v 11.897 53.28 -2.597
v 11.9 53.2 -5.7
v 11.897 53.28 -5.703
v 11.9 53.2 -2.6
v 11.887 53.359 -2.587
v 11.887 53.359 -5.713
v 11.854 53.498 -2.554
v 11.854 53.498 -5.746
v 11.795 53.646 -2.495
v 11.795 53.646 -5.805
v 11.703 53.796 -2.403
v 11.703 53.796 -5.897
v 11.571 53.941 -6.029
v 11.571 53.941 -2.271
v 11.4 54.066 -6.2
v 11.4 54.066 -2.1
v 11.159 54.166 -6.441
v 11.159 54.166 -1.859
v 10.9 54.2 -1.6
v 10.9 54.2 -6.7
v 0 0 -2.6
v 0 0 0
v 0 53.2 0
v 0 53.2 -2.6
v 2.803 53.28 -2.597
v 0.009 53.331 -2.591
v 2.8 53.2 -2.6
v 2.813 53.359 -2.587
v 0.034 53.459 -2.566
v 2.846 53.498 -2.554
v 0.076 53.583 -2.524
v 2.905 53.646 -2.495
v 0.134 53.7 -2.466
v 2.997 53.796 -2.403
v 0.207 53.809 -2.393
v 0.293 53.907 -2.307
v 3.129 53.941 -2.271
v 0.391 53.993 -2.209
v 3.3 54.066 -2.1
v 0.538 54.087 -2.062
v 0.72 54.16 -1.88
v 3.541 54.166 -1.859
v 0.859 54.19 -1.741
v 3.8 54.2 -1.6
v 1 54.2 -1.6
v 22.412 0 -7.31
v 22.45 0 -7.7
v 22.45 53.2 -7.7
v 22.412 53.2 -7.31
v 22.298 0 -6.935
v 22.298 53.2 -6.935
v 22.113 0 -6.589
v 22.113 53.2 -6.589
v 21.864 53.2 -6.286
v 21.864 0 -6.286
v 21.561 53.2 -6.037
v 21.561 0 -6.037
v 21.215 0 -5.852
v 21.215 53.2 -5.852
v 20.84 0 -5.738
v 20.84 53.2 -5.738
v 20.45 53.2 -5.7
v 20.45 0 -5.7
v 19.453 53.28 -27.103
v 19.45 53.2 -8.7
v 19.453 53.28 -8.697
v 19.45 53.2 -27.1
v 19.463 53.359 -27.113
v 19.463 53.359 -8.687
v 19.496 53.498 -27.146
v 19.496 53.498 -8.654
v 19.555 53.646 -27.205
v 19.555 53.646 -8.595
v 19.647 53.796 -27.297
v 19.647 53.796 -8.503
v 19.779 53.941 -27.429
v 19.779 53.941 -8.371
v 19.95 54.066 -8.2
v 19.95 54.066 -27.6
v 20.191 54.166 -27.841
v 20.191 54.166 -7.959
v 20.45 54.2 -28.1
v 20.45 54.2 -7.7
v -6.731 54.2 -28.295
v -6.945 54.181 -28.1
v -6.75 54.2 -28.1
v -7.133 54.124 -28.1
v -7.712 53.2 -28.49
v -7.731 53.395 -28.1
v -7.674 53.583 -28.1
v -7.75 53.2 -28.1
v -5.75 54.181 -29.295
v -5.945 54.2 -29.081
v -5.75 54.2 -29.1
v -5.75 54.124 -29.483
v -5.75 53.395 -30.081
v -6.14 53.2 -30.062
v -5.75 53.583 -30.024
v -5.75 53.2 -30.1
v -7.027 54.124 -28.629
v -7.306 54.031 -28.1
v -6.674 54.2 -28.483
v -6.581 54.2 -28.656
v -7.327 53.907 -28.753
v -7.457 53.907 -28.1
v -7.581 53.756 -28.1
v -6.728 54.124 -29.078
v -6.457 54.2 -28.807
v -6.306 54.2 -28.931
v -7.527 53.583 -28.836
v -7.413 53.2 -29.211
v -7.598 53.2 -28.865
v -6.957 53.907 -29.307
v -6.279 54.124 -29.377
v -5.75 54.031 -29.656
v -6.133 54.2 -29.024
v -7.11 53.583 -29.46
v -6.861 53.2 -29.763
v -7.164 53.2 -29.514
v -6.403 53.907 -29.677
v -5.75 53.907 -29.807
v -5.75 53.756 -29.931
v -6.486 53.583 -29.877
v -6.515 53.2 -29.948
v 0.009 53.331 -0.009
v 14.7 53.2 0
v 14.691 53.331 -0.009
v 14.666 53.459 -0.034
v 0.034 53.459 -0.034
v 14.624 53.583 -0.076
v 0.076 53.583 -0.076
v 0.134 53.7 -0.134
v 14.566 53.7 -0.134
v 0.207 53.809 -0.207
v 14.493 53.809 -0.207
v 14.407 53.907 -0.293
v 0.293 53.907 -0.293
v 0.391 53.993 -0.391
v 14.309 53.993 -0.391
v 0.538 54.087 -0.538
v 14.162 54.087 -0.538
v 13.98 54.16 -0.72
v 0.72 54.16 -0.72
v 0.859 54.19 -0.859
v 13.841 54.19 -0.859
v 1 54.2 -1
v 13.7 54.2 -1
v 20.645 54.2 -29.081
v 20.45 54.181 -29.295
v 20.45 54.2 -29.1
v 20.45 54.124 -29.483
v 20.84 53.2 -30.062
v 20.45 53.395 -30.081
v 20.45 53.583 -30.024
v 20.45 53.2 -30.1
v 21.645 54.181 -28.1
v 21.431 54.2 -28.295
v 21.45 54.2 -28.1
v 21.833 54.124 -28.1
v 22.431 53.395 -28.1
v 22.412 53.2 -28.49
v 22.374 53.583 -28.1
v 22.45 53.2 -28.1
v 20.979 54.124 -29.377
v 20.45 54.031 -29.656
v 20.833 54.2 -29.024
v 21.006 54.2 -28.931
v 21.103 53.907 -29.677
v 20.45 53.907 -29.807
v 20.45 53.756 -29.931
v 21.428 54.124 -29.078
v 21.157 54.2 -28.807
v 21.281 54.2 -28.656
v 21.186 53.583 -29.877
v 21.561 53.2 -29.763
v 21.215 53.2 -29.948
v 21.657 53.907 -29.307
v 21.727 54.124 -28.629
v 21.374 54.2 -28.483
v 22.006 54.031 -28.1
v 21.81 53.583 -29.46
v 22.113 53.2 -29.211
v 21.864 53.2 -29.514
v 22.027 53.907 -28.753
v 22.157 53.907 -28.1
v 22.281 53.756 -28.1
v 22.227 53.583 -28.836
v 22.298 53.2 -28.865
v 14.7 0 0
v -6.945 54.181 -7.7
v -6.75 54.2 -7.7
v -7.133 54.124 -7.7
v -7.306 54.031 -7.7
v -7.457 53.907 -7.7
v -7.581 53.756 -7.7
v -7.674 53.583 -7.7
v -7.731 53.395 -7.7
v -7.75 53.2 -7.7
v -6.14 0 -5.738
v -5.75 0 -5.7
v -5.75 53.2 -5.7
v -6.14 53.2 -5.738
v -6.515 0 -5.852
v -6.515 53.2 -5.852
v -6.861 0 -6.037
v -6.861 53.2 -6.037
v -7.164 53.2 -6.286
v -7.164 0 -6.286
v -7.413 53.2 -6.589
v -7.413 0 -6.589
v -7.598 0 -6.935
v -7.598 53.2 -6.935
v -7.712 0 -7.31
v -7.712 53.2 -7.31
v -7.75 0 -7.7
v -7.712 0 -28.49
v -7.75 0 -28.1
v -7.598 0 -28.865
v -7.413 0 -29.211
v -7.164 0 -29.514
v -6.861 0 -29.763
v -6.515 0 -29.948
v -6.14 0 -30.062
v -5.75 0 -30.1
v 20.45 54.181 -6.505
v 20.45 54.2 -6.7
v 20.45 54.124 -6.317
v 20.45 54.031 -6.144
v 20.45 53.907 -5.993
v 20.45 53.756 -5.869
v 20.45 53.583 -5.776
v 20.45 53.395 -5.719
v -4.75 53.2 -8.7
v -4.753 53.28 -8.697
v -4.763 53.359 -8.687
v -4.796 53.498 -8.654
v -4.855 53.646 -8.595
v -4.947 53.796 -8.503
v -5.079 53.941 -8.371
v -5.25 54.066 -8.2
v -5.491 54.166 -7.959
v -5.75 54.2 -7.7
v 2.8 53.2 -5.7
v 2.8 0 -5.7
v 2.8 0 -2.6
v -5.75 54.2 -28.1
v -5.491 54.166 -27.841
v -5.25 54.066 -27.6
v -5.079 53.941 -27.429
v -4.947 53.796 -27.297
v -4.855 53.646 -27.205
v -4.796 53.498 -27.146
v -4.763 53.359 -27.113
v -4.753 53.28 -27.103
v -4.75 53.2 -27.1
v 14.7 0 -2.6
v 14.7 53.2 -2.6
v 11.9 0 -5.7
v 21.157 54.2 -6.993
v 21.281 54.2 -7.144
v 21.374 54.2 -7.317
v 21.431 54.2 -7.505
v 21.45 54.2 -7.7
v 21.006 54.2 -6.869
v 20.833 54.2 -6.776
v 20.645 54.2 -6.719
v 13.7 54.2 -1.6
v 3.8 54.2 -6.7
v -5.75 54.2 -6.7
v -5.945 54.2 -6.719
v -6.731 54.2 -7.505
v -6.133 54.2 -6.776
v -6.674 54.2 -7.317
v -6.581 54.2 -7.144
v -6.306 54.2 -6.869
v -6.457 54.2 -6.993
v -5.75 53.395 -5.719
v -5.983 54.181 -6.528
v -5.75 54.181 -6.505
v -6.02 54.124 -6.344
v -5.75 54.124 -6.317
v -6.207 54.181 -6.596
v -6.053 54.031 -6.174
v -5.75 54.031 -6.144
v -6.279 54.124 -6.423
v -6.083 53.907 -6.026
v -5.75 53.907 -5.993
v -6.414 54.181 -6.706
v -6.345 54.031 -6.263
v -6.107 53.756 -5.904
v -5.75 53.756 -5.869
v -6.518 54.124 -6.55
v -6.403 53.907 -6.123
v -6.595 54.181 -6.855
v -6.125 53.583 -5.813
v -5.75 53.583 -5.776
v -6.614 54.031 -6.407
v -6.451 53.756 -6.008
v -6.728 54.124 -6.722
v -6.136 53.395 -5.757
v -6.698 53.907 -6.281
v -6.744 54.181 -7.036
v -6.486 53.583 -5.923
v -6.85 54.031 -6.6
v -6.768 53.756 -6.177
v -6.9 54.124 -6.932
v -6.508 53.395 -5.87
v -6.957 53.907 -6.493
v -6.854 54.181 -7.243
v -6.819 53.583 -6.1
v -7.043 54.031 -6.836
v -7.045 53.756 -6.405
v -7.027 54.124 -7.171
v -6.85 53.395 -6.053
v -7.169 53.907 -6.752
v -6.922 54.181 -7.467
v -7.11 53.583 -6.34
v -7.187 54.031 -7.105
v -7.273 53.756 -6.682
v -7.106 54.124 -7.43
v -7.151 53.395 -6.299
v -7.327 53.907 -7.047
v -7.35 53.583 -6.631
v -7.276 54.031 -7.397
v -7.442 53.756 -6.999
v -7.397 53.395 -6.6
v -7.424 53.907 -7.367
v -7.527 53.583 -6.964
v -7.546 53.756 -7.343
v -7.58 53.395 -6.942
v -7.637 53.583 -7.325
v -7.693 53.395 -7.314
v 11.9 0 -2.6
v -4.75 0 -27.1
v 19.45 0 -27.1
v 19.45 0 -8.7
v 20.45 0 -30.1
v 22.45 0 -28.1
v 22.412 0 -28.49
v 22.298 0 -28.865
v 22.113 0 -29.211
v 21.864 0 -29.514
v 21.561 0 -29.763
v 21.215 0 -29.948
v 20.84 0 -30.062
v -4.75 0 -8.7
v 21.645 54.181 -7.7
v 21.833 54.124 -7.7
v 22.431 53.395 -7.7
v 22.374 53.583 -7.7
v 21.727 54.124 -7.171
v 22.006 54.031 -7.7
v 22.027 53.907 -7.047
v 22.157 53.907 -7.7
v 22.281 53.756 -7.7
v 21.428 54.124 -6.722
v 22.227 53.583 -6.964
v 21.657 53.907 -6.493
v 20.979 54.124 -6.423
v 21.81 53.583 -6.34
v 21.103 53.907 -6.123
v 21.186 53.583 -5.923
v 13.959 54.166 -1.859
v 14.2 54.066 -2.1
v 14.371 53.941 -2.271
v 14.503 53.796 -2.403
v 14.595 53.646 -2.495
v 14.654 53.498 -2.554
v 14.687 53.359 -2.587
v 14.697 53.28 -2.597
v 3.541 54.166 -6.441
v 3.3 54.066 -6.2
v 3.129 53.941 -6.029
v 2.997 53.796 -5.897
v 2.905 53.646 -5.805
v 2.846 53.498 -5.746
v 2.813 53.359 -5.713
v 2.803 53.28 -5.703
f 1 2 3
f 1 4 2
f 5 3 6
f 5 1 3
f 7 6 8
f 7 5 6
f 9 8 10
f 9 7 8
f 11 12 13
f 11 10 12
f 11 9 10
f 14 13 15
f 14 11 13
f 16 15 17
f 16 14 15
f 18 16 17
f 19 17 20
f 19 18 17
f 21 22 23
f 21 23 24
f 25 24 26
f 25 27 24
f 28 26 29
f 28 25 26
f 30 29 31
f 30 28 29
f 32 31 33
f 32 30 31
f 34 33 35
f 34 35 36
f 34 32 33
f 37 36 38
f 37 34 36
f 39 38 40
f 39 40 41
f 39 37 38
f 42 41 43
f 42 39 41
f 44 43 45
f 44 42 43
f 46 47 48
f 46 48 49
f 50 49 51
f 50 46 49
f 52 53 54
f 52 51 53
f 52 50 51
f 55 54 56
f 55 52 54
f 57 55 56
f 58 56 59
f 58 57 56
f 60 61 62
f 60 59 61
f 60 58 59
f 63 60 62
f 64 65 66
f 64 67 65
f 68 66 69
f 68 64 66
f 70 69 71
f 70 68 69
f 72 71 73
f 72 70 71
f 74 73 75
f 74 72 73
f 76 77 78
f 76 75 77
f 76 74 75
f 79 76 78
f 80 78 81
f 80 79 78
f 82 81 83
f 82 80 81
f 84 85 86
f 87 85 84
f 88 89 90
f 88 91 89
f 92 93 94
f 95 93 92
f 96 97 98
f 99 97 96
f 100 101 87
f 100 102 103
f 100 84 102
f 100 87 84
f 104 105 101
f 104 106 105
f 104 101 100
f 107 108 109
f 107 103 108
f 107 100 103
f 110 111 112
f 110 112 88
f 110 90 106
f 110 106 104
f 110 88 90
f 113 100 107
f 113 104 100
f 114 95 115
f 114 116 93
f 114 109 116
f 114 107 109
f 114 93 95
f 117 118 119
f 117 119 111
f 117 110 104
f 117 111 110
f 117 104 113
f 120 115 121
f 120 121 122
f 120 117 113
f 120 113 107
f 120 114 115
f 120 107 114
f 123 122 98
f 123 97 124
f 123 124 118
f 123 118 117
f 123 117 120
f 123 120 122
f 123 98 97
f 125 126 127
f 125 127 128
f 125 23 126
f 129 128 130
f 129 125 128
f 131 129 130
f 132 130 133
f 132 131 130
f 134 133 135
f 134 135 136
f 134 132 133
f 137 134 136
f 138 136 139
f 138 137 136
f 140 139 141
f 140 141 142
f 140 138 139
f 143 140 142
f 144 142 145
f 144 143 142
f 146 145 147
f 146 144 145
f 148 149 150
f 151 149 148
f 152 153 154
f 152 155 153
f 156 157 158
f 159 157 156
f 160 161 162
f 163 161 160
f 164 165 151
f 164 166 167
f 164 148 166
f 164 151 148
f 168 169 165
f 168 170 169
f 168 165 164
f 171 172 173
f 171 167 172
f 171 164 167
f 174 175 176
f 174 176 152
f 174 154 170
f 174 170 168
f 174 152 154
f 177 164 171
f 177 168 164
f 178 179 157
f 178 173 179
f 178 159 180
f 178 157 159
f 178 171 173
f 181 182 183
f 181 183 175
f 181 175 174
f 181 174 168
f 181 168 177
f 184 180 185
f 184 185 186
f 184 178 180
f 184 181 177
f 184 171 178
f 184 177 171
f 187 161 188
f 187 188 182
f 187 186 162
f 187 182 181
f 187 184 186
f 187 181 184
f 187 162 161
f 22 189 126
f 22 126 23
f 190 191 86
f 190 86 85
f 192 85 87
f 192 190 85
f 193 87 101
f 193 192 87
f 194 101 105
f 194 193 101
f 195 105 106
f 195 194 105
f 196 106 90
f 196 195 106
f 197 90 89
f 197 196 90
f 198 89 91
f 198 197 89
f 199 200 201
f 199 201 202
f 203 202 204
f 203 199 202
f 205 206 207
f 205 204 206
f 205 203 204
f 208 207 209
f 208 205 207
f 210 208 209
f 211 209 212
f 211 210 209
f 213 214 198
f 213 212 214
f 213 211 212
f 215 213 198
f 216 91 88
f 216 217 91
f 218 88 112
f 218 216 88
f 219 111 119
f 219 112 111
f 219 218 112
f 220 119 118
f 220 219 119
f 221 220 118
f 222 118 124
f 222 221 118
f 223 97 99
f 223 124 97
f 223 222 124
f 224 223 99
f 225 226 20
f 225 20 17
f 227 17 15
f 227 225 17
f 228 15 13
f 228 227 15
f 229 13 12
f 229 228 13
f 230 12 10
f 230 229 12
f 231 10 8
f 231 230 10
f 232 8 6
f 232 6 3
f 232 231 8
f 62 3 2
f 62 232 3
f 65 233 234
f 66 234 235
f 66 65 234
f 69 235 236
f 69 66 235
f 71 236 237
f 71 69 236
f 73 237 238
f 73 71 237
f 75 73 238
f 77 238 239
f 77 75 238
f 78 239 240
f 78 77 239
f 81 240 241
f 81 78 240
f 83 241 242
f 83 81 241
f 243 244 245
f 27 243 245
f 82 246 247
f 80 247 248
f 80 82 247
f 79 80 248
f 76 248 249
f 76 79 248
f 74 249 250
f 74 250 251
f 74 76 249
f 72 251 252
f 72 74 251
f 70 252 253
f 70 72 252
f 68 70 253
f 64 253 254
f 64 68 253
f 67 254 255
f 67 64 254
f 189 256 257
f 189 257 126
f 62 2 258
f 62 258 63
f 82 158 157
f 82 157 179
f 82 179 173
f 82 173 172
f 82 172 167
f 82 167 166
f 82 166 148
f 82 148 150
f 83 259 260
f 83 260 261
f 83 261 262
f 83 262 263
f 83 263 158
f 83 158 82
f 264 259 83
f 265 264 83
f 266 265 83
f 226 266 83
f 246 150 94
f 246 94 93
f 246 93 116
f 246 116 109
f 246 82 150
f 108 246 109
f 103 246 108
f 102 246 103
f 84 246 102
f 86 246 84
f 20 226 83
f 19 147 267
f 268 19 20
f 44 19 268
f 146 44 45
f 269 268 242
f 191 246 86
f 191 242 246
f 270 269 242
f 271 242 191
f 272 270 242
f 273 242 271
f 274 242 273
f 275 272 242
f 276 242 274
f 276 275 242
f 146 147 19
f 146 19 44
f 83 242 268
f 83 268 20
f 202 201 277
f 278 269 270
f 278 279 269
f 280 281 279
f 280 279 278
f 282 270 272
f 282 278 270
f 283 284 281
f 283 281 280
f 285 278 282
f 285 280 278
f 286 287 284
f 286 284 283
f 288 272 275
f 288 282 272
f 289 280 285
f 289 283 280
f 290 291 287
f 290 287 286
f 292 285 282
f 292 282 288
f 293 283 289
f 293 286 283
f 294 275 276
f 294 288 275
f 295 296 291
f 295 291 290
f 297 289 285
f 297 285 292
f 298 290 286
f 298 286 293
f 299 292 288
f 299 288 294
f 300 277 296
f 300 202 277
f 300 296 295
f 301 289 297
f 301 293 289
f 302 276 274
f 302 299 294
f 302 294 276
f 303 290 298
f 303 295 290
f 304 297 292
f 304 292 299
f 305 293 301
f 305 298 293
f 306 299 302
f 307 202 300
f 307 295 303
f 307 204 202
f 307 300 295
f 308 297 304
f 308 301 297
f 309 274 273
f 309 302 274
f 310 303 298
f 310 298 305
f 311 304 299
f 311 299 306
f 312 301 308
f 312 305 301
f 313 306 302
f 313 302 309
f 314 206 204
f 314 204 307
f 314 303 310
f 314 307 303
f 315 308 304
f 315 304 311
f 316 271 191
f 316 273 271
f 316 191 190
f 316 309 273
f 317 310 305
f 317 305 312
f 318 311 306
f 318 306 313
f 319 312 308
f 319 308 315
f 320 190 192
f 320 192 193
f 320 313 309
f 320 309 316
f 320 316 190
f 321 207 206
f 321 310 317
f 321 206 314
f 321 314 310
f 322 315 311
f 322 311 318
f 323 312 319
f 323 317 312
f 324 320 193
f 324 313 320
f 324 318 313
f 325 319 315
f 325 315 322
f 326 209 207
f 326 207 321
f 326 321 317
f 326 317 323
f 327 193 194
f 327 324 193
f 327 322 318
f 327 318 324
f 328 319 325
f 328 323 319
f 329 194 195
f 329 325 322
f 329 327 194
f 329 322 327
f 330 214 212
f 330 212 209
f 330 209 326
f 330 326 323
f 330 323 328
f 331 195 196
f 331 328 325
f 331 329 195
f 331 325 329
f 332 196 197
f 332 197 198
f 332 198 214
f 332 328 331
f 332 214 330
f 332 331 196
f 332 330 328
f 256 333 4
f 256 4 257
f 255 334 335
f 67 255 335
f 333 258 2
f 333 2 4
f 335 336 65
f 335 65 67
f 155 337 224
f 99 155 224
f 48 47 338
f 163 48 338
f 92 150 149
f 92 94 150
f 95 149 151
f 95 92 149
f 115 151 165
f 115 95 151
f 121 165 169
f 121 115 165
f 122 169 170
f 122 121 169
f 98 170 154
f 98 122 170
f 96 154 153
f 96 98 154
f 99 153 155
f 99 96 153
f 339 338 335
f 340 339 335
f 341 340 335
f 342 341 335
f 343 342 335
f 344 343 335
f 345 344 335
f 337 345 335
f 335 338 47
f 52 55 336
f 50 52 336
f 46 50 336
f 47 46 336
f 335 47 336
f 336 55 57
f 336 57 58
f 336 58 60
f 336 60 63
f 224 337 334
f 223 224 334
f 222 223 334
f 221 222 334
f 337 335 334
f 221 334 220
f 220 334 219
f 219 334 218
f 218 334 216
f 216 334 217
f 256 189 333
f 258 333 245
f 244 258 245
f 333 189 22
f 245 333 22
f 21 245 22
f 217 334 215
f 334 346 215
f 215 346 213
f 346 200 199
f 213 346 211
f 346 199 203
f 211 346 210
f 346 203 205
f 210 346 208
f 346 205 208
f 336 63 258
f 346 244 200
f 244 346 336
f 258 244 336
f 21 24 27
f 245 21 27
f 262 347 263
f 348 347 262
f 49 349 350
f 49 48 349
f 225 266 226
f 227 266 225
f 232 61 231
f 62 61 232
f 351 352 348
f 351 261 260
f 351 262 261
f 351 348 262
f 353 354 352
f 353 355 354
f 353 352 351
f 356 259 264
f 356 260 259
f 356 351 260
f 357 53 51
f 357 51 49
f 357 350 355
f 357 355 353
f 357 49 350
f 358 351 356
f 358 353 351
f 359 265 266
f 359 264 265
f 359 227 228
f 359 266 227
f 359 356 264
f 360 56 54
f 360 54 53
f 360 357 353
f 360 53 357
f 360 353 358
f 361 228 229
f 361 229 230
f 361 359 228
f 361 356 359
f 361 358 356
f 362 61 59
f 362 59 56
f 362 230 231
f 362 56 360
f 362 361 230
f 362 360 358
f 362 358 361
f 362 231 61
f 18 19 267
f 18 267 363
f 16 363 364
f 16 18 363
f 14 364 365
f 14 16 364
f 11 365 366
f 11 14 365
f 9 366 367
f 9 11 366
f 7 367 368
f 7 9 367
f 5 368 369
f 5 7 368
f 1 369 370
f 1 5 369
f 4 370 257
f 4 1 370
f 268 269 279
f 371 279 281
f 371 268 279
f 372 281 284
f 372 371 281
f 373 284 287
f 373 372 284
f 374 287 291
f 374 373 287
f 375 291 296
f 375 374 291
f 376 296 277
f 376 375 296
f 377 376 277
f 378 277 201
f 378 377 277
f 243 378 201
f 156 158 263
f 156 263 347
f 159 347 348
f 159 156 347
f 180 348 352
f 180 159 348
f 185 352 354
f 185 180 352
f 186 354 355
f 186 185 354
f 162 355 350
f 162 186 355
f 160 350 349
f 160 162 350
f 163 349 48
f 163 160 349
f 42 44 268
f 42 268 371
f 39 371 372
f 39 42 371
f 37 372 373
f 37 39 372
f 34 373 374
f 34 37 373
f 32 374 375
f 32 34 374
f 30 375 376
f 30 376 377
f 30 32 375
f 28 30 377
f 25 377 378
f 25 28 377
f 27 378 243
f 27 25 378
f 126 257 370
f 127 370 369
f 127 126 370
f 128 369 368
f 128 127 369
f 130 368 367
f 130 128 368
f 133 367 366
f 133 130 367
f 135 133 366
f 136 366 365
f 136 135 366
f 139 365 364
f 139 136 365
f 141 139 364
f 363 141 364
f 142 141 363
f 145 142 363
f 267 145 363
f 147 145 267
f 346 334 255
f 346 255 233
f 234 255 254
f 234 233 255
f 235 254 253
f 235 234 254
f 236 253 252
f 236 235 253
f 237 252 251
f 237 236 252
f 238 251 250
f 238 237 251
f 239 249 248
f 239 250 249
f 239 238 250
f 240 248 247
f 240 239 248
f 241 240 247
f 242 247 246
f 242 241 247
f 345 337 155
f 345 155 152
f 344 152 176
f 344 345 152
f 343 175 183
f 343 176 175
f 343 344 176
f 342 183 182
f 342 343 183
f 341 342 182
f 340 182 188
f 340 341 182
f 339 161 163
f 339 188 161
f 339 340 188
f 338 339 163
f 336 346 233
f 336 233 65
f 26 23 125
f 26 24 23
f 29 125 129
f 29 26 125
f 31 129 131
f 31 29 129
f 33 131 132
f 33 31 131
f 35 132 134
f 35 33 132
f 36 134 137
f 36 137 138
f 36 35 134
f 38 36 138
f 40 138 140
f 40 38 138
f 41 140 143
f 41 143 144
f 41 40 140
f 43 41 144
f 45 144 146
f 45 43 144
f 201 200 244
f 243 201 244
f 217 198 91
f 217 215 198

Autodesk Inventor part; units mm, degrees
ref_plane "YZ Plane" through (0, 0, 0) normal (1, 0, 0) x (0, 1, 0)
ref_plane "XZ Plane" through (0, 0, 0) normal (0, 1, 0) x (-1, 0, 0)
ref_plane "XY Plane" through (0, 0, 0) normal (0, 0, 1) x (1, 0, 0)
sketch "Boceto1" plane through (0, 0, 0) normal (0, 1, 0) x (-1, 0, 0)
  line L0 (0, 0) -> (0, -2.6)
  line L1 (0, -2.6) -> (-2.7, -2.6)
  line L2 (-2.7, -2.6) -> (-2.7, -5.7)
  line L3 (-2.7, -5.7) -> (-12, -5.7)
  line L4 (-12, -5.7) -> (-12, -2.6)
  line L5 (-12, -2.6) -> (-14.7, -2.6)
  line L6 (-14.7, -2.6) -> (-14.7, 0)
  line L7 (-14.7, 0) -> (0, 0)
  line L8 (-12, -5.7) -> (-11.9, -5.7)
  line L9 (-11.9, -5.7) -> (-11.9, -2.6)
  line L10 (-11.9, -2.6) -> (-12, -2.6)
  line L11 (-12, -2.6) -> (-12, -5.7)
  line L12 (-2.7, -5.7) -> (-2.8, -5.7)
  line L13 (-2.8, -5.7) -> (-2.8, -2.6)
  line L14 (-2.8, -2.6) -> (-2.7, -2.6)
  line L15 (-2.7, -2.6) -> (-2.7, -5.7)
  line L16 (-2.7, -5.7) -> (4.75, -5.7)
  line L17 (-2.7, -5.7) -> (4.75, -5.7) construction
  line L18 (-12, -5.7) -> (-19.45, -5.7)
  line L19 (-12, -5.7) -> (-4.55, -5.7) construction
  line L20 (4.75, -5.7) -> (5.75, -5.7)
  line L21 (7.75, -7.7) -> (7.75, -8.7)
  line L22 (7.75, -8.7) -> (4.75, -8.7)
  line L23 (4.75, -8.7) -> (4.75, -5.7)
  line L24 (-19.45, -5.7) -> (-20.45, -5.7)
  line L25 (-22.45, -7.7) -> (-22.45, -8.7)
  line L26 (-22.45, -8.7) -> (-19.45, -8.7)
  line L27 (-19.45, -8.7) -> (-19.45, -5.7)
  line L28 (4.75, -8.7) -> (-19.45, -8.7)
  line L29 (4.75, -8.7) -> (7.75, -8.7)
  line L30 (7.75, -8.7) -> (7.75, -27.1)
  line L31 (7.75, -27.1) -> (4.75, -27.1)
  line L32 (4.75, -27.1) -> (4.75, -8.7)
  line L33 (-22.45, -8.7) -> (-19.45, -8.7)
  line L34 (-19.45, -8.7) -> (-19.45, -27.1)
  line L35 (-19.45, -27.1) -> (-22.45, -27.1)
  line L36 (-22.45, -27.1) -> (-22.45, -8.7)
  line L37 (7.75, -27.1) -> (-22.45, -27.1)
  line L38 (-22.45, -27.1) -> (-22.45, -28.1)
  line L39 (-20.45, -30.1) -> (5.75, -30.1)
  line L40 (7.75, -28.1) -> (7.75, -27.1)
  arc A0 (7.75, -7.7) -> (5.75, -5.7) centre (5.75, -7.7) ccw
  arc A1 (5.75, -30.1) -> (7.75, -28.1) centre (5.75, -28.1) ccw
  arc A2 (-22.45, -28.1) -> (-20.45, -30.1) centre (-20.45, -28.1) ccw
  arc A3 (-20.45, -5.7) -> (-22.45, -7.7) centre (-20.45, -7.7) ccw
  point P0 (-7.35, -5.7)
  point P1 (7.75, -5.7)
  point P2 (-22.45, -5.7)
  point P3 (-22.45, -30.1)
  point P4 (7.75, -30.1)
  dimension "d0" = 2.6
  dimension "d1" = 2.7
  dimension "d2" = 3.1
  dimension "d3" = 2.7
  dimension "d4" = 9.3
  dimension "d5" = 0.1
  dimension "d6" = 0.1
  dimension "d7" = 0
  dimension "d8" = 12.1
  dimension "d9" = 180
  dimension "d10" = 12.1
  dimension "d11" = 3
  dimension "d12" = 3
  dimension "d13" = 3
  dimension "d14" = 3
  dimension "d15" = 18.4
  dimension "d16" = 3
  dimension "d17" = 3
  dimension "d18" = 3
  dimension "d19" = 30.2
  dimension "d20" = 2
extrude "Extrusión1" add sketch "Boceto1" along normal blind 54.2 contours L0 L1 L14 L13 L3 L9 L10 L5 L6 L7 | L16 L23 L28 L27 L18 L3 | L20 A0 L21 L22 L23 | L22 L30 L31 L32 | L27 L26 L25 A3 L24 | L34 L35 L36 L26 | L31 L40 A1 L39 A2 L38 L35 L37
fillet "Empalme1" radius 1 20 edges at (-4.75, 54.2, -17.9) (-7.1642, 54.2, -29.5142) (-7.75, 54.2, -8.2) (-7.1642, 54.2, -6.2858) (2.75, 54.2, -5.7) (21.8642, 54.2, -29.5142) (22.45, 54.2, -8.2) (21.8642, 54.2, -6.2858) (11.95, 54.2, -5.7) (7.35, 54.2, -30.1) (7.35, 54.2, -27.1) (19.45, 54.2, -17.9) (7.35, 54.2, -8.7) (11.9, 54.2, -4.15) (2.8, 54.2, -4.15) (1.35, 54.2, -2.6) (0, 54.2, -1.3) (7.35, 54.2, 0) (14.7, 54.2, -1.3) (13.35, 54.2, -2.6)
properties part number "cajaBuck"
